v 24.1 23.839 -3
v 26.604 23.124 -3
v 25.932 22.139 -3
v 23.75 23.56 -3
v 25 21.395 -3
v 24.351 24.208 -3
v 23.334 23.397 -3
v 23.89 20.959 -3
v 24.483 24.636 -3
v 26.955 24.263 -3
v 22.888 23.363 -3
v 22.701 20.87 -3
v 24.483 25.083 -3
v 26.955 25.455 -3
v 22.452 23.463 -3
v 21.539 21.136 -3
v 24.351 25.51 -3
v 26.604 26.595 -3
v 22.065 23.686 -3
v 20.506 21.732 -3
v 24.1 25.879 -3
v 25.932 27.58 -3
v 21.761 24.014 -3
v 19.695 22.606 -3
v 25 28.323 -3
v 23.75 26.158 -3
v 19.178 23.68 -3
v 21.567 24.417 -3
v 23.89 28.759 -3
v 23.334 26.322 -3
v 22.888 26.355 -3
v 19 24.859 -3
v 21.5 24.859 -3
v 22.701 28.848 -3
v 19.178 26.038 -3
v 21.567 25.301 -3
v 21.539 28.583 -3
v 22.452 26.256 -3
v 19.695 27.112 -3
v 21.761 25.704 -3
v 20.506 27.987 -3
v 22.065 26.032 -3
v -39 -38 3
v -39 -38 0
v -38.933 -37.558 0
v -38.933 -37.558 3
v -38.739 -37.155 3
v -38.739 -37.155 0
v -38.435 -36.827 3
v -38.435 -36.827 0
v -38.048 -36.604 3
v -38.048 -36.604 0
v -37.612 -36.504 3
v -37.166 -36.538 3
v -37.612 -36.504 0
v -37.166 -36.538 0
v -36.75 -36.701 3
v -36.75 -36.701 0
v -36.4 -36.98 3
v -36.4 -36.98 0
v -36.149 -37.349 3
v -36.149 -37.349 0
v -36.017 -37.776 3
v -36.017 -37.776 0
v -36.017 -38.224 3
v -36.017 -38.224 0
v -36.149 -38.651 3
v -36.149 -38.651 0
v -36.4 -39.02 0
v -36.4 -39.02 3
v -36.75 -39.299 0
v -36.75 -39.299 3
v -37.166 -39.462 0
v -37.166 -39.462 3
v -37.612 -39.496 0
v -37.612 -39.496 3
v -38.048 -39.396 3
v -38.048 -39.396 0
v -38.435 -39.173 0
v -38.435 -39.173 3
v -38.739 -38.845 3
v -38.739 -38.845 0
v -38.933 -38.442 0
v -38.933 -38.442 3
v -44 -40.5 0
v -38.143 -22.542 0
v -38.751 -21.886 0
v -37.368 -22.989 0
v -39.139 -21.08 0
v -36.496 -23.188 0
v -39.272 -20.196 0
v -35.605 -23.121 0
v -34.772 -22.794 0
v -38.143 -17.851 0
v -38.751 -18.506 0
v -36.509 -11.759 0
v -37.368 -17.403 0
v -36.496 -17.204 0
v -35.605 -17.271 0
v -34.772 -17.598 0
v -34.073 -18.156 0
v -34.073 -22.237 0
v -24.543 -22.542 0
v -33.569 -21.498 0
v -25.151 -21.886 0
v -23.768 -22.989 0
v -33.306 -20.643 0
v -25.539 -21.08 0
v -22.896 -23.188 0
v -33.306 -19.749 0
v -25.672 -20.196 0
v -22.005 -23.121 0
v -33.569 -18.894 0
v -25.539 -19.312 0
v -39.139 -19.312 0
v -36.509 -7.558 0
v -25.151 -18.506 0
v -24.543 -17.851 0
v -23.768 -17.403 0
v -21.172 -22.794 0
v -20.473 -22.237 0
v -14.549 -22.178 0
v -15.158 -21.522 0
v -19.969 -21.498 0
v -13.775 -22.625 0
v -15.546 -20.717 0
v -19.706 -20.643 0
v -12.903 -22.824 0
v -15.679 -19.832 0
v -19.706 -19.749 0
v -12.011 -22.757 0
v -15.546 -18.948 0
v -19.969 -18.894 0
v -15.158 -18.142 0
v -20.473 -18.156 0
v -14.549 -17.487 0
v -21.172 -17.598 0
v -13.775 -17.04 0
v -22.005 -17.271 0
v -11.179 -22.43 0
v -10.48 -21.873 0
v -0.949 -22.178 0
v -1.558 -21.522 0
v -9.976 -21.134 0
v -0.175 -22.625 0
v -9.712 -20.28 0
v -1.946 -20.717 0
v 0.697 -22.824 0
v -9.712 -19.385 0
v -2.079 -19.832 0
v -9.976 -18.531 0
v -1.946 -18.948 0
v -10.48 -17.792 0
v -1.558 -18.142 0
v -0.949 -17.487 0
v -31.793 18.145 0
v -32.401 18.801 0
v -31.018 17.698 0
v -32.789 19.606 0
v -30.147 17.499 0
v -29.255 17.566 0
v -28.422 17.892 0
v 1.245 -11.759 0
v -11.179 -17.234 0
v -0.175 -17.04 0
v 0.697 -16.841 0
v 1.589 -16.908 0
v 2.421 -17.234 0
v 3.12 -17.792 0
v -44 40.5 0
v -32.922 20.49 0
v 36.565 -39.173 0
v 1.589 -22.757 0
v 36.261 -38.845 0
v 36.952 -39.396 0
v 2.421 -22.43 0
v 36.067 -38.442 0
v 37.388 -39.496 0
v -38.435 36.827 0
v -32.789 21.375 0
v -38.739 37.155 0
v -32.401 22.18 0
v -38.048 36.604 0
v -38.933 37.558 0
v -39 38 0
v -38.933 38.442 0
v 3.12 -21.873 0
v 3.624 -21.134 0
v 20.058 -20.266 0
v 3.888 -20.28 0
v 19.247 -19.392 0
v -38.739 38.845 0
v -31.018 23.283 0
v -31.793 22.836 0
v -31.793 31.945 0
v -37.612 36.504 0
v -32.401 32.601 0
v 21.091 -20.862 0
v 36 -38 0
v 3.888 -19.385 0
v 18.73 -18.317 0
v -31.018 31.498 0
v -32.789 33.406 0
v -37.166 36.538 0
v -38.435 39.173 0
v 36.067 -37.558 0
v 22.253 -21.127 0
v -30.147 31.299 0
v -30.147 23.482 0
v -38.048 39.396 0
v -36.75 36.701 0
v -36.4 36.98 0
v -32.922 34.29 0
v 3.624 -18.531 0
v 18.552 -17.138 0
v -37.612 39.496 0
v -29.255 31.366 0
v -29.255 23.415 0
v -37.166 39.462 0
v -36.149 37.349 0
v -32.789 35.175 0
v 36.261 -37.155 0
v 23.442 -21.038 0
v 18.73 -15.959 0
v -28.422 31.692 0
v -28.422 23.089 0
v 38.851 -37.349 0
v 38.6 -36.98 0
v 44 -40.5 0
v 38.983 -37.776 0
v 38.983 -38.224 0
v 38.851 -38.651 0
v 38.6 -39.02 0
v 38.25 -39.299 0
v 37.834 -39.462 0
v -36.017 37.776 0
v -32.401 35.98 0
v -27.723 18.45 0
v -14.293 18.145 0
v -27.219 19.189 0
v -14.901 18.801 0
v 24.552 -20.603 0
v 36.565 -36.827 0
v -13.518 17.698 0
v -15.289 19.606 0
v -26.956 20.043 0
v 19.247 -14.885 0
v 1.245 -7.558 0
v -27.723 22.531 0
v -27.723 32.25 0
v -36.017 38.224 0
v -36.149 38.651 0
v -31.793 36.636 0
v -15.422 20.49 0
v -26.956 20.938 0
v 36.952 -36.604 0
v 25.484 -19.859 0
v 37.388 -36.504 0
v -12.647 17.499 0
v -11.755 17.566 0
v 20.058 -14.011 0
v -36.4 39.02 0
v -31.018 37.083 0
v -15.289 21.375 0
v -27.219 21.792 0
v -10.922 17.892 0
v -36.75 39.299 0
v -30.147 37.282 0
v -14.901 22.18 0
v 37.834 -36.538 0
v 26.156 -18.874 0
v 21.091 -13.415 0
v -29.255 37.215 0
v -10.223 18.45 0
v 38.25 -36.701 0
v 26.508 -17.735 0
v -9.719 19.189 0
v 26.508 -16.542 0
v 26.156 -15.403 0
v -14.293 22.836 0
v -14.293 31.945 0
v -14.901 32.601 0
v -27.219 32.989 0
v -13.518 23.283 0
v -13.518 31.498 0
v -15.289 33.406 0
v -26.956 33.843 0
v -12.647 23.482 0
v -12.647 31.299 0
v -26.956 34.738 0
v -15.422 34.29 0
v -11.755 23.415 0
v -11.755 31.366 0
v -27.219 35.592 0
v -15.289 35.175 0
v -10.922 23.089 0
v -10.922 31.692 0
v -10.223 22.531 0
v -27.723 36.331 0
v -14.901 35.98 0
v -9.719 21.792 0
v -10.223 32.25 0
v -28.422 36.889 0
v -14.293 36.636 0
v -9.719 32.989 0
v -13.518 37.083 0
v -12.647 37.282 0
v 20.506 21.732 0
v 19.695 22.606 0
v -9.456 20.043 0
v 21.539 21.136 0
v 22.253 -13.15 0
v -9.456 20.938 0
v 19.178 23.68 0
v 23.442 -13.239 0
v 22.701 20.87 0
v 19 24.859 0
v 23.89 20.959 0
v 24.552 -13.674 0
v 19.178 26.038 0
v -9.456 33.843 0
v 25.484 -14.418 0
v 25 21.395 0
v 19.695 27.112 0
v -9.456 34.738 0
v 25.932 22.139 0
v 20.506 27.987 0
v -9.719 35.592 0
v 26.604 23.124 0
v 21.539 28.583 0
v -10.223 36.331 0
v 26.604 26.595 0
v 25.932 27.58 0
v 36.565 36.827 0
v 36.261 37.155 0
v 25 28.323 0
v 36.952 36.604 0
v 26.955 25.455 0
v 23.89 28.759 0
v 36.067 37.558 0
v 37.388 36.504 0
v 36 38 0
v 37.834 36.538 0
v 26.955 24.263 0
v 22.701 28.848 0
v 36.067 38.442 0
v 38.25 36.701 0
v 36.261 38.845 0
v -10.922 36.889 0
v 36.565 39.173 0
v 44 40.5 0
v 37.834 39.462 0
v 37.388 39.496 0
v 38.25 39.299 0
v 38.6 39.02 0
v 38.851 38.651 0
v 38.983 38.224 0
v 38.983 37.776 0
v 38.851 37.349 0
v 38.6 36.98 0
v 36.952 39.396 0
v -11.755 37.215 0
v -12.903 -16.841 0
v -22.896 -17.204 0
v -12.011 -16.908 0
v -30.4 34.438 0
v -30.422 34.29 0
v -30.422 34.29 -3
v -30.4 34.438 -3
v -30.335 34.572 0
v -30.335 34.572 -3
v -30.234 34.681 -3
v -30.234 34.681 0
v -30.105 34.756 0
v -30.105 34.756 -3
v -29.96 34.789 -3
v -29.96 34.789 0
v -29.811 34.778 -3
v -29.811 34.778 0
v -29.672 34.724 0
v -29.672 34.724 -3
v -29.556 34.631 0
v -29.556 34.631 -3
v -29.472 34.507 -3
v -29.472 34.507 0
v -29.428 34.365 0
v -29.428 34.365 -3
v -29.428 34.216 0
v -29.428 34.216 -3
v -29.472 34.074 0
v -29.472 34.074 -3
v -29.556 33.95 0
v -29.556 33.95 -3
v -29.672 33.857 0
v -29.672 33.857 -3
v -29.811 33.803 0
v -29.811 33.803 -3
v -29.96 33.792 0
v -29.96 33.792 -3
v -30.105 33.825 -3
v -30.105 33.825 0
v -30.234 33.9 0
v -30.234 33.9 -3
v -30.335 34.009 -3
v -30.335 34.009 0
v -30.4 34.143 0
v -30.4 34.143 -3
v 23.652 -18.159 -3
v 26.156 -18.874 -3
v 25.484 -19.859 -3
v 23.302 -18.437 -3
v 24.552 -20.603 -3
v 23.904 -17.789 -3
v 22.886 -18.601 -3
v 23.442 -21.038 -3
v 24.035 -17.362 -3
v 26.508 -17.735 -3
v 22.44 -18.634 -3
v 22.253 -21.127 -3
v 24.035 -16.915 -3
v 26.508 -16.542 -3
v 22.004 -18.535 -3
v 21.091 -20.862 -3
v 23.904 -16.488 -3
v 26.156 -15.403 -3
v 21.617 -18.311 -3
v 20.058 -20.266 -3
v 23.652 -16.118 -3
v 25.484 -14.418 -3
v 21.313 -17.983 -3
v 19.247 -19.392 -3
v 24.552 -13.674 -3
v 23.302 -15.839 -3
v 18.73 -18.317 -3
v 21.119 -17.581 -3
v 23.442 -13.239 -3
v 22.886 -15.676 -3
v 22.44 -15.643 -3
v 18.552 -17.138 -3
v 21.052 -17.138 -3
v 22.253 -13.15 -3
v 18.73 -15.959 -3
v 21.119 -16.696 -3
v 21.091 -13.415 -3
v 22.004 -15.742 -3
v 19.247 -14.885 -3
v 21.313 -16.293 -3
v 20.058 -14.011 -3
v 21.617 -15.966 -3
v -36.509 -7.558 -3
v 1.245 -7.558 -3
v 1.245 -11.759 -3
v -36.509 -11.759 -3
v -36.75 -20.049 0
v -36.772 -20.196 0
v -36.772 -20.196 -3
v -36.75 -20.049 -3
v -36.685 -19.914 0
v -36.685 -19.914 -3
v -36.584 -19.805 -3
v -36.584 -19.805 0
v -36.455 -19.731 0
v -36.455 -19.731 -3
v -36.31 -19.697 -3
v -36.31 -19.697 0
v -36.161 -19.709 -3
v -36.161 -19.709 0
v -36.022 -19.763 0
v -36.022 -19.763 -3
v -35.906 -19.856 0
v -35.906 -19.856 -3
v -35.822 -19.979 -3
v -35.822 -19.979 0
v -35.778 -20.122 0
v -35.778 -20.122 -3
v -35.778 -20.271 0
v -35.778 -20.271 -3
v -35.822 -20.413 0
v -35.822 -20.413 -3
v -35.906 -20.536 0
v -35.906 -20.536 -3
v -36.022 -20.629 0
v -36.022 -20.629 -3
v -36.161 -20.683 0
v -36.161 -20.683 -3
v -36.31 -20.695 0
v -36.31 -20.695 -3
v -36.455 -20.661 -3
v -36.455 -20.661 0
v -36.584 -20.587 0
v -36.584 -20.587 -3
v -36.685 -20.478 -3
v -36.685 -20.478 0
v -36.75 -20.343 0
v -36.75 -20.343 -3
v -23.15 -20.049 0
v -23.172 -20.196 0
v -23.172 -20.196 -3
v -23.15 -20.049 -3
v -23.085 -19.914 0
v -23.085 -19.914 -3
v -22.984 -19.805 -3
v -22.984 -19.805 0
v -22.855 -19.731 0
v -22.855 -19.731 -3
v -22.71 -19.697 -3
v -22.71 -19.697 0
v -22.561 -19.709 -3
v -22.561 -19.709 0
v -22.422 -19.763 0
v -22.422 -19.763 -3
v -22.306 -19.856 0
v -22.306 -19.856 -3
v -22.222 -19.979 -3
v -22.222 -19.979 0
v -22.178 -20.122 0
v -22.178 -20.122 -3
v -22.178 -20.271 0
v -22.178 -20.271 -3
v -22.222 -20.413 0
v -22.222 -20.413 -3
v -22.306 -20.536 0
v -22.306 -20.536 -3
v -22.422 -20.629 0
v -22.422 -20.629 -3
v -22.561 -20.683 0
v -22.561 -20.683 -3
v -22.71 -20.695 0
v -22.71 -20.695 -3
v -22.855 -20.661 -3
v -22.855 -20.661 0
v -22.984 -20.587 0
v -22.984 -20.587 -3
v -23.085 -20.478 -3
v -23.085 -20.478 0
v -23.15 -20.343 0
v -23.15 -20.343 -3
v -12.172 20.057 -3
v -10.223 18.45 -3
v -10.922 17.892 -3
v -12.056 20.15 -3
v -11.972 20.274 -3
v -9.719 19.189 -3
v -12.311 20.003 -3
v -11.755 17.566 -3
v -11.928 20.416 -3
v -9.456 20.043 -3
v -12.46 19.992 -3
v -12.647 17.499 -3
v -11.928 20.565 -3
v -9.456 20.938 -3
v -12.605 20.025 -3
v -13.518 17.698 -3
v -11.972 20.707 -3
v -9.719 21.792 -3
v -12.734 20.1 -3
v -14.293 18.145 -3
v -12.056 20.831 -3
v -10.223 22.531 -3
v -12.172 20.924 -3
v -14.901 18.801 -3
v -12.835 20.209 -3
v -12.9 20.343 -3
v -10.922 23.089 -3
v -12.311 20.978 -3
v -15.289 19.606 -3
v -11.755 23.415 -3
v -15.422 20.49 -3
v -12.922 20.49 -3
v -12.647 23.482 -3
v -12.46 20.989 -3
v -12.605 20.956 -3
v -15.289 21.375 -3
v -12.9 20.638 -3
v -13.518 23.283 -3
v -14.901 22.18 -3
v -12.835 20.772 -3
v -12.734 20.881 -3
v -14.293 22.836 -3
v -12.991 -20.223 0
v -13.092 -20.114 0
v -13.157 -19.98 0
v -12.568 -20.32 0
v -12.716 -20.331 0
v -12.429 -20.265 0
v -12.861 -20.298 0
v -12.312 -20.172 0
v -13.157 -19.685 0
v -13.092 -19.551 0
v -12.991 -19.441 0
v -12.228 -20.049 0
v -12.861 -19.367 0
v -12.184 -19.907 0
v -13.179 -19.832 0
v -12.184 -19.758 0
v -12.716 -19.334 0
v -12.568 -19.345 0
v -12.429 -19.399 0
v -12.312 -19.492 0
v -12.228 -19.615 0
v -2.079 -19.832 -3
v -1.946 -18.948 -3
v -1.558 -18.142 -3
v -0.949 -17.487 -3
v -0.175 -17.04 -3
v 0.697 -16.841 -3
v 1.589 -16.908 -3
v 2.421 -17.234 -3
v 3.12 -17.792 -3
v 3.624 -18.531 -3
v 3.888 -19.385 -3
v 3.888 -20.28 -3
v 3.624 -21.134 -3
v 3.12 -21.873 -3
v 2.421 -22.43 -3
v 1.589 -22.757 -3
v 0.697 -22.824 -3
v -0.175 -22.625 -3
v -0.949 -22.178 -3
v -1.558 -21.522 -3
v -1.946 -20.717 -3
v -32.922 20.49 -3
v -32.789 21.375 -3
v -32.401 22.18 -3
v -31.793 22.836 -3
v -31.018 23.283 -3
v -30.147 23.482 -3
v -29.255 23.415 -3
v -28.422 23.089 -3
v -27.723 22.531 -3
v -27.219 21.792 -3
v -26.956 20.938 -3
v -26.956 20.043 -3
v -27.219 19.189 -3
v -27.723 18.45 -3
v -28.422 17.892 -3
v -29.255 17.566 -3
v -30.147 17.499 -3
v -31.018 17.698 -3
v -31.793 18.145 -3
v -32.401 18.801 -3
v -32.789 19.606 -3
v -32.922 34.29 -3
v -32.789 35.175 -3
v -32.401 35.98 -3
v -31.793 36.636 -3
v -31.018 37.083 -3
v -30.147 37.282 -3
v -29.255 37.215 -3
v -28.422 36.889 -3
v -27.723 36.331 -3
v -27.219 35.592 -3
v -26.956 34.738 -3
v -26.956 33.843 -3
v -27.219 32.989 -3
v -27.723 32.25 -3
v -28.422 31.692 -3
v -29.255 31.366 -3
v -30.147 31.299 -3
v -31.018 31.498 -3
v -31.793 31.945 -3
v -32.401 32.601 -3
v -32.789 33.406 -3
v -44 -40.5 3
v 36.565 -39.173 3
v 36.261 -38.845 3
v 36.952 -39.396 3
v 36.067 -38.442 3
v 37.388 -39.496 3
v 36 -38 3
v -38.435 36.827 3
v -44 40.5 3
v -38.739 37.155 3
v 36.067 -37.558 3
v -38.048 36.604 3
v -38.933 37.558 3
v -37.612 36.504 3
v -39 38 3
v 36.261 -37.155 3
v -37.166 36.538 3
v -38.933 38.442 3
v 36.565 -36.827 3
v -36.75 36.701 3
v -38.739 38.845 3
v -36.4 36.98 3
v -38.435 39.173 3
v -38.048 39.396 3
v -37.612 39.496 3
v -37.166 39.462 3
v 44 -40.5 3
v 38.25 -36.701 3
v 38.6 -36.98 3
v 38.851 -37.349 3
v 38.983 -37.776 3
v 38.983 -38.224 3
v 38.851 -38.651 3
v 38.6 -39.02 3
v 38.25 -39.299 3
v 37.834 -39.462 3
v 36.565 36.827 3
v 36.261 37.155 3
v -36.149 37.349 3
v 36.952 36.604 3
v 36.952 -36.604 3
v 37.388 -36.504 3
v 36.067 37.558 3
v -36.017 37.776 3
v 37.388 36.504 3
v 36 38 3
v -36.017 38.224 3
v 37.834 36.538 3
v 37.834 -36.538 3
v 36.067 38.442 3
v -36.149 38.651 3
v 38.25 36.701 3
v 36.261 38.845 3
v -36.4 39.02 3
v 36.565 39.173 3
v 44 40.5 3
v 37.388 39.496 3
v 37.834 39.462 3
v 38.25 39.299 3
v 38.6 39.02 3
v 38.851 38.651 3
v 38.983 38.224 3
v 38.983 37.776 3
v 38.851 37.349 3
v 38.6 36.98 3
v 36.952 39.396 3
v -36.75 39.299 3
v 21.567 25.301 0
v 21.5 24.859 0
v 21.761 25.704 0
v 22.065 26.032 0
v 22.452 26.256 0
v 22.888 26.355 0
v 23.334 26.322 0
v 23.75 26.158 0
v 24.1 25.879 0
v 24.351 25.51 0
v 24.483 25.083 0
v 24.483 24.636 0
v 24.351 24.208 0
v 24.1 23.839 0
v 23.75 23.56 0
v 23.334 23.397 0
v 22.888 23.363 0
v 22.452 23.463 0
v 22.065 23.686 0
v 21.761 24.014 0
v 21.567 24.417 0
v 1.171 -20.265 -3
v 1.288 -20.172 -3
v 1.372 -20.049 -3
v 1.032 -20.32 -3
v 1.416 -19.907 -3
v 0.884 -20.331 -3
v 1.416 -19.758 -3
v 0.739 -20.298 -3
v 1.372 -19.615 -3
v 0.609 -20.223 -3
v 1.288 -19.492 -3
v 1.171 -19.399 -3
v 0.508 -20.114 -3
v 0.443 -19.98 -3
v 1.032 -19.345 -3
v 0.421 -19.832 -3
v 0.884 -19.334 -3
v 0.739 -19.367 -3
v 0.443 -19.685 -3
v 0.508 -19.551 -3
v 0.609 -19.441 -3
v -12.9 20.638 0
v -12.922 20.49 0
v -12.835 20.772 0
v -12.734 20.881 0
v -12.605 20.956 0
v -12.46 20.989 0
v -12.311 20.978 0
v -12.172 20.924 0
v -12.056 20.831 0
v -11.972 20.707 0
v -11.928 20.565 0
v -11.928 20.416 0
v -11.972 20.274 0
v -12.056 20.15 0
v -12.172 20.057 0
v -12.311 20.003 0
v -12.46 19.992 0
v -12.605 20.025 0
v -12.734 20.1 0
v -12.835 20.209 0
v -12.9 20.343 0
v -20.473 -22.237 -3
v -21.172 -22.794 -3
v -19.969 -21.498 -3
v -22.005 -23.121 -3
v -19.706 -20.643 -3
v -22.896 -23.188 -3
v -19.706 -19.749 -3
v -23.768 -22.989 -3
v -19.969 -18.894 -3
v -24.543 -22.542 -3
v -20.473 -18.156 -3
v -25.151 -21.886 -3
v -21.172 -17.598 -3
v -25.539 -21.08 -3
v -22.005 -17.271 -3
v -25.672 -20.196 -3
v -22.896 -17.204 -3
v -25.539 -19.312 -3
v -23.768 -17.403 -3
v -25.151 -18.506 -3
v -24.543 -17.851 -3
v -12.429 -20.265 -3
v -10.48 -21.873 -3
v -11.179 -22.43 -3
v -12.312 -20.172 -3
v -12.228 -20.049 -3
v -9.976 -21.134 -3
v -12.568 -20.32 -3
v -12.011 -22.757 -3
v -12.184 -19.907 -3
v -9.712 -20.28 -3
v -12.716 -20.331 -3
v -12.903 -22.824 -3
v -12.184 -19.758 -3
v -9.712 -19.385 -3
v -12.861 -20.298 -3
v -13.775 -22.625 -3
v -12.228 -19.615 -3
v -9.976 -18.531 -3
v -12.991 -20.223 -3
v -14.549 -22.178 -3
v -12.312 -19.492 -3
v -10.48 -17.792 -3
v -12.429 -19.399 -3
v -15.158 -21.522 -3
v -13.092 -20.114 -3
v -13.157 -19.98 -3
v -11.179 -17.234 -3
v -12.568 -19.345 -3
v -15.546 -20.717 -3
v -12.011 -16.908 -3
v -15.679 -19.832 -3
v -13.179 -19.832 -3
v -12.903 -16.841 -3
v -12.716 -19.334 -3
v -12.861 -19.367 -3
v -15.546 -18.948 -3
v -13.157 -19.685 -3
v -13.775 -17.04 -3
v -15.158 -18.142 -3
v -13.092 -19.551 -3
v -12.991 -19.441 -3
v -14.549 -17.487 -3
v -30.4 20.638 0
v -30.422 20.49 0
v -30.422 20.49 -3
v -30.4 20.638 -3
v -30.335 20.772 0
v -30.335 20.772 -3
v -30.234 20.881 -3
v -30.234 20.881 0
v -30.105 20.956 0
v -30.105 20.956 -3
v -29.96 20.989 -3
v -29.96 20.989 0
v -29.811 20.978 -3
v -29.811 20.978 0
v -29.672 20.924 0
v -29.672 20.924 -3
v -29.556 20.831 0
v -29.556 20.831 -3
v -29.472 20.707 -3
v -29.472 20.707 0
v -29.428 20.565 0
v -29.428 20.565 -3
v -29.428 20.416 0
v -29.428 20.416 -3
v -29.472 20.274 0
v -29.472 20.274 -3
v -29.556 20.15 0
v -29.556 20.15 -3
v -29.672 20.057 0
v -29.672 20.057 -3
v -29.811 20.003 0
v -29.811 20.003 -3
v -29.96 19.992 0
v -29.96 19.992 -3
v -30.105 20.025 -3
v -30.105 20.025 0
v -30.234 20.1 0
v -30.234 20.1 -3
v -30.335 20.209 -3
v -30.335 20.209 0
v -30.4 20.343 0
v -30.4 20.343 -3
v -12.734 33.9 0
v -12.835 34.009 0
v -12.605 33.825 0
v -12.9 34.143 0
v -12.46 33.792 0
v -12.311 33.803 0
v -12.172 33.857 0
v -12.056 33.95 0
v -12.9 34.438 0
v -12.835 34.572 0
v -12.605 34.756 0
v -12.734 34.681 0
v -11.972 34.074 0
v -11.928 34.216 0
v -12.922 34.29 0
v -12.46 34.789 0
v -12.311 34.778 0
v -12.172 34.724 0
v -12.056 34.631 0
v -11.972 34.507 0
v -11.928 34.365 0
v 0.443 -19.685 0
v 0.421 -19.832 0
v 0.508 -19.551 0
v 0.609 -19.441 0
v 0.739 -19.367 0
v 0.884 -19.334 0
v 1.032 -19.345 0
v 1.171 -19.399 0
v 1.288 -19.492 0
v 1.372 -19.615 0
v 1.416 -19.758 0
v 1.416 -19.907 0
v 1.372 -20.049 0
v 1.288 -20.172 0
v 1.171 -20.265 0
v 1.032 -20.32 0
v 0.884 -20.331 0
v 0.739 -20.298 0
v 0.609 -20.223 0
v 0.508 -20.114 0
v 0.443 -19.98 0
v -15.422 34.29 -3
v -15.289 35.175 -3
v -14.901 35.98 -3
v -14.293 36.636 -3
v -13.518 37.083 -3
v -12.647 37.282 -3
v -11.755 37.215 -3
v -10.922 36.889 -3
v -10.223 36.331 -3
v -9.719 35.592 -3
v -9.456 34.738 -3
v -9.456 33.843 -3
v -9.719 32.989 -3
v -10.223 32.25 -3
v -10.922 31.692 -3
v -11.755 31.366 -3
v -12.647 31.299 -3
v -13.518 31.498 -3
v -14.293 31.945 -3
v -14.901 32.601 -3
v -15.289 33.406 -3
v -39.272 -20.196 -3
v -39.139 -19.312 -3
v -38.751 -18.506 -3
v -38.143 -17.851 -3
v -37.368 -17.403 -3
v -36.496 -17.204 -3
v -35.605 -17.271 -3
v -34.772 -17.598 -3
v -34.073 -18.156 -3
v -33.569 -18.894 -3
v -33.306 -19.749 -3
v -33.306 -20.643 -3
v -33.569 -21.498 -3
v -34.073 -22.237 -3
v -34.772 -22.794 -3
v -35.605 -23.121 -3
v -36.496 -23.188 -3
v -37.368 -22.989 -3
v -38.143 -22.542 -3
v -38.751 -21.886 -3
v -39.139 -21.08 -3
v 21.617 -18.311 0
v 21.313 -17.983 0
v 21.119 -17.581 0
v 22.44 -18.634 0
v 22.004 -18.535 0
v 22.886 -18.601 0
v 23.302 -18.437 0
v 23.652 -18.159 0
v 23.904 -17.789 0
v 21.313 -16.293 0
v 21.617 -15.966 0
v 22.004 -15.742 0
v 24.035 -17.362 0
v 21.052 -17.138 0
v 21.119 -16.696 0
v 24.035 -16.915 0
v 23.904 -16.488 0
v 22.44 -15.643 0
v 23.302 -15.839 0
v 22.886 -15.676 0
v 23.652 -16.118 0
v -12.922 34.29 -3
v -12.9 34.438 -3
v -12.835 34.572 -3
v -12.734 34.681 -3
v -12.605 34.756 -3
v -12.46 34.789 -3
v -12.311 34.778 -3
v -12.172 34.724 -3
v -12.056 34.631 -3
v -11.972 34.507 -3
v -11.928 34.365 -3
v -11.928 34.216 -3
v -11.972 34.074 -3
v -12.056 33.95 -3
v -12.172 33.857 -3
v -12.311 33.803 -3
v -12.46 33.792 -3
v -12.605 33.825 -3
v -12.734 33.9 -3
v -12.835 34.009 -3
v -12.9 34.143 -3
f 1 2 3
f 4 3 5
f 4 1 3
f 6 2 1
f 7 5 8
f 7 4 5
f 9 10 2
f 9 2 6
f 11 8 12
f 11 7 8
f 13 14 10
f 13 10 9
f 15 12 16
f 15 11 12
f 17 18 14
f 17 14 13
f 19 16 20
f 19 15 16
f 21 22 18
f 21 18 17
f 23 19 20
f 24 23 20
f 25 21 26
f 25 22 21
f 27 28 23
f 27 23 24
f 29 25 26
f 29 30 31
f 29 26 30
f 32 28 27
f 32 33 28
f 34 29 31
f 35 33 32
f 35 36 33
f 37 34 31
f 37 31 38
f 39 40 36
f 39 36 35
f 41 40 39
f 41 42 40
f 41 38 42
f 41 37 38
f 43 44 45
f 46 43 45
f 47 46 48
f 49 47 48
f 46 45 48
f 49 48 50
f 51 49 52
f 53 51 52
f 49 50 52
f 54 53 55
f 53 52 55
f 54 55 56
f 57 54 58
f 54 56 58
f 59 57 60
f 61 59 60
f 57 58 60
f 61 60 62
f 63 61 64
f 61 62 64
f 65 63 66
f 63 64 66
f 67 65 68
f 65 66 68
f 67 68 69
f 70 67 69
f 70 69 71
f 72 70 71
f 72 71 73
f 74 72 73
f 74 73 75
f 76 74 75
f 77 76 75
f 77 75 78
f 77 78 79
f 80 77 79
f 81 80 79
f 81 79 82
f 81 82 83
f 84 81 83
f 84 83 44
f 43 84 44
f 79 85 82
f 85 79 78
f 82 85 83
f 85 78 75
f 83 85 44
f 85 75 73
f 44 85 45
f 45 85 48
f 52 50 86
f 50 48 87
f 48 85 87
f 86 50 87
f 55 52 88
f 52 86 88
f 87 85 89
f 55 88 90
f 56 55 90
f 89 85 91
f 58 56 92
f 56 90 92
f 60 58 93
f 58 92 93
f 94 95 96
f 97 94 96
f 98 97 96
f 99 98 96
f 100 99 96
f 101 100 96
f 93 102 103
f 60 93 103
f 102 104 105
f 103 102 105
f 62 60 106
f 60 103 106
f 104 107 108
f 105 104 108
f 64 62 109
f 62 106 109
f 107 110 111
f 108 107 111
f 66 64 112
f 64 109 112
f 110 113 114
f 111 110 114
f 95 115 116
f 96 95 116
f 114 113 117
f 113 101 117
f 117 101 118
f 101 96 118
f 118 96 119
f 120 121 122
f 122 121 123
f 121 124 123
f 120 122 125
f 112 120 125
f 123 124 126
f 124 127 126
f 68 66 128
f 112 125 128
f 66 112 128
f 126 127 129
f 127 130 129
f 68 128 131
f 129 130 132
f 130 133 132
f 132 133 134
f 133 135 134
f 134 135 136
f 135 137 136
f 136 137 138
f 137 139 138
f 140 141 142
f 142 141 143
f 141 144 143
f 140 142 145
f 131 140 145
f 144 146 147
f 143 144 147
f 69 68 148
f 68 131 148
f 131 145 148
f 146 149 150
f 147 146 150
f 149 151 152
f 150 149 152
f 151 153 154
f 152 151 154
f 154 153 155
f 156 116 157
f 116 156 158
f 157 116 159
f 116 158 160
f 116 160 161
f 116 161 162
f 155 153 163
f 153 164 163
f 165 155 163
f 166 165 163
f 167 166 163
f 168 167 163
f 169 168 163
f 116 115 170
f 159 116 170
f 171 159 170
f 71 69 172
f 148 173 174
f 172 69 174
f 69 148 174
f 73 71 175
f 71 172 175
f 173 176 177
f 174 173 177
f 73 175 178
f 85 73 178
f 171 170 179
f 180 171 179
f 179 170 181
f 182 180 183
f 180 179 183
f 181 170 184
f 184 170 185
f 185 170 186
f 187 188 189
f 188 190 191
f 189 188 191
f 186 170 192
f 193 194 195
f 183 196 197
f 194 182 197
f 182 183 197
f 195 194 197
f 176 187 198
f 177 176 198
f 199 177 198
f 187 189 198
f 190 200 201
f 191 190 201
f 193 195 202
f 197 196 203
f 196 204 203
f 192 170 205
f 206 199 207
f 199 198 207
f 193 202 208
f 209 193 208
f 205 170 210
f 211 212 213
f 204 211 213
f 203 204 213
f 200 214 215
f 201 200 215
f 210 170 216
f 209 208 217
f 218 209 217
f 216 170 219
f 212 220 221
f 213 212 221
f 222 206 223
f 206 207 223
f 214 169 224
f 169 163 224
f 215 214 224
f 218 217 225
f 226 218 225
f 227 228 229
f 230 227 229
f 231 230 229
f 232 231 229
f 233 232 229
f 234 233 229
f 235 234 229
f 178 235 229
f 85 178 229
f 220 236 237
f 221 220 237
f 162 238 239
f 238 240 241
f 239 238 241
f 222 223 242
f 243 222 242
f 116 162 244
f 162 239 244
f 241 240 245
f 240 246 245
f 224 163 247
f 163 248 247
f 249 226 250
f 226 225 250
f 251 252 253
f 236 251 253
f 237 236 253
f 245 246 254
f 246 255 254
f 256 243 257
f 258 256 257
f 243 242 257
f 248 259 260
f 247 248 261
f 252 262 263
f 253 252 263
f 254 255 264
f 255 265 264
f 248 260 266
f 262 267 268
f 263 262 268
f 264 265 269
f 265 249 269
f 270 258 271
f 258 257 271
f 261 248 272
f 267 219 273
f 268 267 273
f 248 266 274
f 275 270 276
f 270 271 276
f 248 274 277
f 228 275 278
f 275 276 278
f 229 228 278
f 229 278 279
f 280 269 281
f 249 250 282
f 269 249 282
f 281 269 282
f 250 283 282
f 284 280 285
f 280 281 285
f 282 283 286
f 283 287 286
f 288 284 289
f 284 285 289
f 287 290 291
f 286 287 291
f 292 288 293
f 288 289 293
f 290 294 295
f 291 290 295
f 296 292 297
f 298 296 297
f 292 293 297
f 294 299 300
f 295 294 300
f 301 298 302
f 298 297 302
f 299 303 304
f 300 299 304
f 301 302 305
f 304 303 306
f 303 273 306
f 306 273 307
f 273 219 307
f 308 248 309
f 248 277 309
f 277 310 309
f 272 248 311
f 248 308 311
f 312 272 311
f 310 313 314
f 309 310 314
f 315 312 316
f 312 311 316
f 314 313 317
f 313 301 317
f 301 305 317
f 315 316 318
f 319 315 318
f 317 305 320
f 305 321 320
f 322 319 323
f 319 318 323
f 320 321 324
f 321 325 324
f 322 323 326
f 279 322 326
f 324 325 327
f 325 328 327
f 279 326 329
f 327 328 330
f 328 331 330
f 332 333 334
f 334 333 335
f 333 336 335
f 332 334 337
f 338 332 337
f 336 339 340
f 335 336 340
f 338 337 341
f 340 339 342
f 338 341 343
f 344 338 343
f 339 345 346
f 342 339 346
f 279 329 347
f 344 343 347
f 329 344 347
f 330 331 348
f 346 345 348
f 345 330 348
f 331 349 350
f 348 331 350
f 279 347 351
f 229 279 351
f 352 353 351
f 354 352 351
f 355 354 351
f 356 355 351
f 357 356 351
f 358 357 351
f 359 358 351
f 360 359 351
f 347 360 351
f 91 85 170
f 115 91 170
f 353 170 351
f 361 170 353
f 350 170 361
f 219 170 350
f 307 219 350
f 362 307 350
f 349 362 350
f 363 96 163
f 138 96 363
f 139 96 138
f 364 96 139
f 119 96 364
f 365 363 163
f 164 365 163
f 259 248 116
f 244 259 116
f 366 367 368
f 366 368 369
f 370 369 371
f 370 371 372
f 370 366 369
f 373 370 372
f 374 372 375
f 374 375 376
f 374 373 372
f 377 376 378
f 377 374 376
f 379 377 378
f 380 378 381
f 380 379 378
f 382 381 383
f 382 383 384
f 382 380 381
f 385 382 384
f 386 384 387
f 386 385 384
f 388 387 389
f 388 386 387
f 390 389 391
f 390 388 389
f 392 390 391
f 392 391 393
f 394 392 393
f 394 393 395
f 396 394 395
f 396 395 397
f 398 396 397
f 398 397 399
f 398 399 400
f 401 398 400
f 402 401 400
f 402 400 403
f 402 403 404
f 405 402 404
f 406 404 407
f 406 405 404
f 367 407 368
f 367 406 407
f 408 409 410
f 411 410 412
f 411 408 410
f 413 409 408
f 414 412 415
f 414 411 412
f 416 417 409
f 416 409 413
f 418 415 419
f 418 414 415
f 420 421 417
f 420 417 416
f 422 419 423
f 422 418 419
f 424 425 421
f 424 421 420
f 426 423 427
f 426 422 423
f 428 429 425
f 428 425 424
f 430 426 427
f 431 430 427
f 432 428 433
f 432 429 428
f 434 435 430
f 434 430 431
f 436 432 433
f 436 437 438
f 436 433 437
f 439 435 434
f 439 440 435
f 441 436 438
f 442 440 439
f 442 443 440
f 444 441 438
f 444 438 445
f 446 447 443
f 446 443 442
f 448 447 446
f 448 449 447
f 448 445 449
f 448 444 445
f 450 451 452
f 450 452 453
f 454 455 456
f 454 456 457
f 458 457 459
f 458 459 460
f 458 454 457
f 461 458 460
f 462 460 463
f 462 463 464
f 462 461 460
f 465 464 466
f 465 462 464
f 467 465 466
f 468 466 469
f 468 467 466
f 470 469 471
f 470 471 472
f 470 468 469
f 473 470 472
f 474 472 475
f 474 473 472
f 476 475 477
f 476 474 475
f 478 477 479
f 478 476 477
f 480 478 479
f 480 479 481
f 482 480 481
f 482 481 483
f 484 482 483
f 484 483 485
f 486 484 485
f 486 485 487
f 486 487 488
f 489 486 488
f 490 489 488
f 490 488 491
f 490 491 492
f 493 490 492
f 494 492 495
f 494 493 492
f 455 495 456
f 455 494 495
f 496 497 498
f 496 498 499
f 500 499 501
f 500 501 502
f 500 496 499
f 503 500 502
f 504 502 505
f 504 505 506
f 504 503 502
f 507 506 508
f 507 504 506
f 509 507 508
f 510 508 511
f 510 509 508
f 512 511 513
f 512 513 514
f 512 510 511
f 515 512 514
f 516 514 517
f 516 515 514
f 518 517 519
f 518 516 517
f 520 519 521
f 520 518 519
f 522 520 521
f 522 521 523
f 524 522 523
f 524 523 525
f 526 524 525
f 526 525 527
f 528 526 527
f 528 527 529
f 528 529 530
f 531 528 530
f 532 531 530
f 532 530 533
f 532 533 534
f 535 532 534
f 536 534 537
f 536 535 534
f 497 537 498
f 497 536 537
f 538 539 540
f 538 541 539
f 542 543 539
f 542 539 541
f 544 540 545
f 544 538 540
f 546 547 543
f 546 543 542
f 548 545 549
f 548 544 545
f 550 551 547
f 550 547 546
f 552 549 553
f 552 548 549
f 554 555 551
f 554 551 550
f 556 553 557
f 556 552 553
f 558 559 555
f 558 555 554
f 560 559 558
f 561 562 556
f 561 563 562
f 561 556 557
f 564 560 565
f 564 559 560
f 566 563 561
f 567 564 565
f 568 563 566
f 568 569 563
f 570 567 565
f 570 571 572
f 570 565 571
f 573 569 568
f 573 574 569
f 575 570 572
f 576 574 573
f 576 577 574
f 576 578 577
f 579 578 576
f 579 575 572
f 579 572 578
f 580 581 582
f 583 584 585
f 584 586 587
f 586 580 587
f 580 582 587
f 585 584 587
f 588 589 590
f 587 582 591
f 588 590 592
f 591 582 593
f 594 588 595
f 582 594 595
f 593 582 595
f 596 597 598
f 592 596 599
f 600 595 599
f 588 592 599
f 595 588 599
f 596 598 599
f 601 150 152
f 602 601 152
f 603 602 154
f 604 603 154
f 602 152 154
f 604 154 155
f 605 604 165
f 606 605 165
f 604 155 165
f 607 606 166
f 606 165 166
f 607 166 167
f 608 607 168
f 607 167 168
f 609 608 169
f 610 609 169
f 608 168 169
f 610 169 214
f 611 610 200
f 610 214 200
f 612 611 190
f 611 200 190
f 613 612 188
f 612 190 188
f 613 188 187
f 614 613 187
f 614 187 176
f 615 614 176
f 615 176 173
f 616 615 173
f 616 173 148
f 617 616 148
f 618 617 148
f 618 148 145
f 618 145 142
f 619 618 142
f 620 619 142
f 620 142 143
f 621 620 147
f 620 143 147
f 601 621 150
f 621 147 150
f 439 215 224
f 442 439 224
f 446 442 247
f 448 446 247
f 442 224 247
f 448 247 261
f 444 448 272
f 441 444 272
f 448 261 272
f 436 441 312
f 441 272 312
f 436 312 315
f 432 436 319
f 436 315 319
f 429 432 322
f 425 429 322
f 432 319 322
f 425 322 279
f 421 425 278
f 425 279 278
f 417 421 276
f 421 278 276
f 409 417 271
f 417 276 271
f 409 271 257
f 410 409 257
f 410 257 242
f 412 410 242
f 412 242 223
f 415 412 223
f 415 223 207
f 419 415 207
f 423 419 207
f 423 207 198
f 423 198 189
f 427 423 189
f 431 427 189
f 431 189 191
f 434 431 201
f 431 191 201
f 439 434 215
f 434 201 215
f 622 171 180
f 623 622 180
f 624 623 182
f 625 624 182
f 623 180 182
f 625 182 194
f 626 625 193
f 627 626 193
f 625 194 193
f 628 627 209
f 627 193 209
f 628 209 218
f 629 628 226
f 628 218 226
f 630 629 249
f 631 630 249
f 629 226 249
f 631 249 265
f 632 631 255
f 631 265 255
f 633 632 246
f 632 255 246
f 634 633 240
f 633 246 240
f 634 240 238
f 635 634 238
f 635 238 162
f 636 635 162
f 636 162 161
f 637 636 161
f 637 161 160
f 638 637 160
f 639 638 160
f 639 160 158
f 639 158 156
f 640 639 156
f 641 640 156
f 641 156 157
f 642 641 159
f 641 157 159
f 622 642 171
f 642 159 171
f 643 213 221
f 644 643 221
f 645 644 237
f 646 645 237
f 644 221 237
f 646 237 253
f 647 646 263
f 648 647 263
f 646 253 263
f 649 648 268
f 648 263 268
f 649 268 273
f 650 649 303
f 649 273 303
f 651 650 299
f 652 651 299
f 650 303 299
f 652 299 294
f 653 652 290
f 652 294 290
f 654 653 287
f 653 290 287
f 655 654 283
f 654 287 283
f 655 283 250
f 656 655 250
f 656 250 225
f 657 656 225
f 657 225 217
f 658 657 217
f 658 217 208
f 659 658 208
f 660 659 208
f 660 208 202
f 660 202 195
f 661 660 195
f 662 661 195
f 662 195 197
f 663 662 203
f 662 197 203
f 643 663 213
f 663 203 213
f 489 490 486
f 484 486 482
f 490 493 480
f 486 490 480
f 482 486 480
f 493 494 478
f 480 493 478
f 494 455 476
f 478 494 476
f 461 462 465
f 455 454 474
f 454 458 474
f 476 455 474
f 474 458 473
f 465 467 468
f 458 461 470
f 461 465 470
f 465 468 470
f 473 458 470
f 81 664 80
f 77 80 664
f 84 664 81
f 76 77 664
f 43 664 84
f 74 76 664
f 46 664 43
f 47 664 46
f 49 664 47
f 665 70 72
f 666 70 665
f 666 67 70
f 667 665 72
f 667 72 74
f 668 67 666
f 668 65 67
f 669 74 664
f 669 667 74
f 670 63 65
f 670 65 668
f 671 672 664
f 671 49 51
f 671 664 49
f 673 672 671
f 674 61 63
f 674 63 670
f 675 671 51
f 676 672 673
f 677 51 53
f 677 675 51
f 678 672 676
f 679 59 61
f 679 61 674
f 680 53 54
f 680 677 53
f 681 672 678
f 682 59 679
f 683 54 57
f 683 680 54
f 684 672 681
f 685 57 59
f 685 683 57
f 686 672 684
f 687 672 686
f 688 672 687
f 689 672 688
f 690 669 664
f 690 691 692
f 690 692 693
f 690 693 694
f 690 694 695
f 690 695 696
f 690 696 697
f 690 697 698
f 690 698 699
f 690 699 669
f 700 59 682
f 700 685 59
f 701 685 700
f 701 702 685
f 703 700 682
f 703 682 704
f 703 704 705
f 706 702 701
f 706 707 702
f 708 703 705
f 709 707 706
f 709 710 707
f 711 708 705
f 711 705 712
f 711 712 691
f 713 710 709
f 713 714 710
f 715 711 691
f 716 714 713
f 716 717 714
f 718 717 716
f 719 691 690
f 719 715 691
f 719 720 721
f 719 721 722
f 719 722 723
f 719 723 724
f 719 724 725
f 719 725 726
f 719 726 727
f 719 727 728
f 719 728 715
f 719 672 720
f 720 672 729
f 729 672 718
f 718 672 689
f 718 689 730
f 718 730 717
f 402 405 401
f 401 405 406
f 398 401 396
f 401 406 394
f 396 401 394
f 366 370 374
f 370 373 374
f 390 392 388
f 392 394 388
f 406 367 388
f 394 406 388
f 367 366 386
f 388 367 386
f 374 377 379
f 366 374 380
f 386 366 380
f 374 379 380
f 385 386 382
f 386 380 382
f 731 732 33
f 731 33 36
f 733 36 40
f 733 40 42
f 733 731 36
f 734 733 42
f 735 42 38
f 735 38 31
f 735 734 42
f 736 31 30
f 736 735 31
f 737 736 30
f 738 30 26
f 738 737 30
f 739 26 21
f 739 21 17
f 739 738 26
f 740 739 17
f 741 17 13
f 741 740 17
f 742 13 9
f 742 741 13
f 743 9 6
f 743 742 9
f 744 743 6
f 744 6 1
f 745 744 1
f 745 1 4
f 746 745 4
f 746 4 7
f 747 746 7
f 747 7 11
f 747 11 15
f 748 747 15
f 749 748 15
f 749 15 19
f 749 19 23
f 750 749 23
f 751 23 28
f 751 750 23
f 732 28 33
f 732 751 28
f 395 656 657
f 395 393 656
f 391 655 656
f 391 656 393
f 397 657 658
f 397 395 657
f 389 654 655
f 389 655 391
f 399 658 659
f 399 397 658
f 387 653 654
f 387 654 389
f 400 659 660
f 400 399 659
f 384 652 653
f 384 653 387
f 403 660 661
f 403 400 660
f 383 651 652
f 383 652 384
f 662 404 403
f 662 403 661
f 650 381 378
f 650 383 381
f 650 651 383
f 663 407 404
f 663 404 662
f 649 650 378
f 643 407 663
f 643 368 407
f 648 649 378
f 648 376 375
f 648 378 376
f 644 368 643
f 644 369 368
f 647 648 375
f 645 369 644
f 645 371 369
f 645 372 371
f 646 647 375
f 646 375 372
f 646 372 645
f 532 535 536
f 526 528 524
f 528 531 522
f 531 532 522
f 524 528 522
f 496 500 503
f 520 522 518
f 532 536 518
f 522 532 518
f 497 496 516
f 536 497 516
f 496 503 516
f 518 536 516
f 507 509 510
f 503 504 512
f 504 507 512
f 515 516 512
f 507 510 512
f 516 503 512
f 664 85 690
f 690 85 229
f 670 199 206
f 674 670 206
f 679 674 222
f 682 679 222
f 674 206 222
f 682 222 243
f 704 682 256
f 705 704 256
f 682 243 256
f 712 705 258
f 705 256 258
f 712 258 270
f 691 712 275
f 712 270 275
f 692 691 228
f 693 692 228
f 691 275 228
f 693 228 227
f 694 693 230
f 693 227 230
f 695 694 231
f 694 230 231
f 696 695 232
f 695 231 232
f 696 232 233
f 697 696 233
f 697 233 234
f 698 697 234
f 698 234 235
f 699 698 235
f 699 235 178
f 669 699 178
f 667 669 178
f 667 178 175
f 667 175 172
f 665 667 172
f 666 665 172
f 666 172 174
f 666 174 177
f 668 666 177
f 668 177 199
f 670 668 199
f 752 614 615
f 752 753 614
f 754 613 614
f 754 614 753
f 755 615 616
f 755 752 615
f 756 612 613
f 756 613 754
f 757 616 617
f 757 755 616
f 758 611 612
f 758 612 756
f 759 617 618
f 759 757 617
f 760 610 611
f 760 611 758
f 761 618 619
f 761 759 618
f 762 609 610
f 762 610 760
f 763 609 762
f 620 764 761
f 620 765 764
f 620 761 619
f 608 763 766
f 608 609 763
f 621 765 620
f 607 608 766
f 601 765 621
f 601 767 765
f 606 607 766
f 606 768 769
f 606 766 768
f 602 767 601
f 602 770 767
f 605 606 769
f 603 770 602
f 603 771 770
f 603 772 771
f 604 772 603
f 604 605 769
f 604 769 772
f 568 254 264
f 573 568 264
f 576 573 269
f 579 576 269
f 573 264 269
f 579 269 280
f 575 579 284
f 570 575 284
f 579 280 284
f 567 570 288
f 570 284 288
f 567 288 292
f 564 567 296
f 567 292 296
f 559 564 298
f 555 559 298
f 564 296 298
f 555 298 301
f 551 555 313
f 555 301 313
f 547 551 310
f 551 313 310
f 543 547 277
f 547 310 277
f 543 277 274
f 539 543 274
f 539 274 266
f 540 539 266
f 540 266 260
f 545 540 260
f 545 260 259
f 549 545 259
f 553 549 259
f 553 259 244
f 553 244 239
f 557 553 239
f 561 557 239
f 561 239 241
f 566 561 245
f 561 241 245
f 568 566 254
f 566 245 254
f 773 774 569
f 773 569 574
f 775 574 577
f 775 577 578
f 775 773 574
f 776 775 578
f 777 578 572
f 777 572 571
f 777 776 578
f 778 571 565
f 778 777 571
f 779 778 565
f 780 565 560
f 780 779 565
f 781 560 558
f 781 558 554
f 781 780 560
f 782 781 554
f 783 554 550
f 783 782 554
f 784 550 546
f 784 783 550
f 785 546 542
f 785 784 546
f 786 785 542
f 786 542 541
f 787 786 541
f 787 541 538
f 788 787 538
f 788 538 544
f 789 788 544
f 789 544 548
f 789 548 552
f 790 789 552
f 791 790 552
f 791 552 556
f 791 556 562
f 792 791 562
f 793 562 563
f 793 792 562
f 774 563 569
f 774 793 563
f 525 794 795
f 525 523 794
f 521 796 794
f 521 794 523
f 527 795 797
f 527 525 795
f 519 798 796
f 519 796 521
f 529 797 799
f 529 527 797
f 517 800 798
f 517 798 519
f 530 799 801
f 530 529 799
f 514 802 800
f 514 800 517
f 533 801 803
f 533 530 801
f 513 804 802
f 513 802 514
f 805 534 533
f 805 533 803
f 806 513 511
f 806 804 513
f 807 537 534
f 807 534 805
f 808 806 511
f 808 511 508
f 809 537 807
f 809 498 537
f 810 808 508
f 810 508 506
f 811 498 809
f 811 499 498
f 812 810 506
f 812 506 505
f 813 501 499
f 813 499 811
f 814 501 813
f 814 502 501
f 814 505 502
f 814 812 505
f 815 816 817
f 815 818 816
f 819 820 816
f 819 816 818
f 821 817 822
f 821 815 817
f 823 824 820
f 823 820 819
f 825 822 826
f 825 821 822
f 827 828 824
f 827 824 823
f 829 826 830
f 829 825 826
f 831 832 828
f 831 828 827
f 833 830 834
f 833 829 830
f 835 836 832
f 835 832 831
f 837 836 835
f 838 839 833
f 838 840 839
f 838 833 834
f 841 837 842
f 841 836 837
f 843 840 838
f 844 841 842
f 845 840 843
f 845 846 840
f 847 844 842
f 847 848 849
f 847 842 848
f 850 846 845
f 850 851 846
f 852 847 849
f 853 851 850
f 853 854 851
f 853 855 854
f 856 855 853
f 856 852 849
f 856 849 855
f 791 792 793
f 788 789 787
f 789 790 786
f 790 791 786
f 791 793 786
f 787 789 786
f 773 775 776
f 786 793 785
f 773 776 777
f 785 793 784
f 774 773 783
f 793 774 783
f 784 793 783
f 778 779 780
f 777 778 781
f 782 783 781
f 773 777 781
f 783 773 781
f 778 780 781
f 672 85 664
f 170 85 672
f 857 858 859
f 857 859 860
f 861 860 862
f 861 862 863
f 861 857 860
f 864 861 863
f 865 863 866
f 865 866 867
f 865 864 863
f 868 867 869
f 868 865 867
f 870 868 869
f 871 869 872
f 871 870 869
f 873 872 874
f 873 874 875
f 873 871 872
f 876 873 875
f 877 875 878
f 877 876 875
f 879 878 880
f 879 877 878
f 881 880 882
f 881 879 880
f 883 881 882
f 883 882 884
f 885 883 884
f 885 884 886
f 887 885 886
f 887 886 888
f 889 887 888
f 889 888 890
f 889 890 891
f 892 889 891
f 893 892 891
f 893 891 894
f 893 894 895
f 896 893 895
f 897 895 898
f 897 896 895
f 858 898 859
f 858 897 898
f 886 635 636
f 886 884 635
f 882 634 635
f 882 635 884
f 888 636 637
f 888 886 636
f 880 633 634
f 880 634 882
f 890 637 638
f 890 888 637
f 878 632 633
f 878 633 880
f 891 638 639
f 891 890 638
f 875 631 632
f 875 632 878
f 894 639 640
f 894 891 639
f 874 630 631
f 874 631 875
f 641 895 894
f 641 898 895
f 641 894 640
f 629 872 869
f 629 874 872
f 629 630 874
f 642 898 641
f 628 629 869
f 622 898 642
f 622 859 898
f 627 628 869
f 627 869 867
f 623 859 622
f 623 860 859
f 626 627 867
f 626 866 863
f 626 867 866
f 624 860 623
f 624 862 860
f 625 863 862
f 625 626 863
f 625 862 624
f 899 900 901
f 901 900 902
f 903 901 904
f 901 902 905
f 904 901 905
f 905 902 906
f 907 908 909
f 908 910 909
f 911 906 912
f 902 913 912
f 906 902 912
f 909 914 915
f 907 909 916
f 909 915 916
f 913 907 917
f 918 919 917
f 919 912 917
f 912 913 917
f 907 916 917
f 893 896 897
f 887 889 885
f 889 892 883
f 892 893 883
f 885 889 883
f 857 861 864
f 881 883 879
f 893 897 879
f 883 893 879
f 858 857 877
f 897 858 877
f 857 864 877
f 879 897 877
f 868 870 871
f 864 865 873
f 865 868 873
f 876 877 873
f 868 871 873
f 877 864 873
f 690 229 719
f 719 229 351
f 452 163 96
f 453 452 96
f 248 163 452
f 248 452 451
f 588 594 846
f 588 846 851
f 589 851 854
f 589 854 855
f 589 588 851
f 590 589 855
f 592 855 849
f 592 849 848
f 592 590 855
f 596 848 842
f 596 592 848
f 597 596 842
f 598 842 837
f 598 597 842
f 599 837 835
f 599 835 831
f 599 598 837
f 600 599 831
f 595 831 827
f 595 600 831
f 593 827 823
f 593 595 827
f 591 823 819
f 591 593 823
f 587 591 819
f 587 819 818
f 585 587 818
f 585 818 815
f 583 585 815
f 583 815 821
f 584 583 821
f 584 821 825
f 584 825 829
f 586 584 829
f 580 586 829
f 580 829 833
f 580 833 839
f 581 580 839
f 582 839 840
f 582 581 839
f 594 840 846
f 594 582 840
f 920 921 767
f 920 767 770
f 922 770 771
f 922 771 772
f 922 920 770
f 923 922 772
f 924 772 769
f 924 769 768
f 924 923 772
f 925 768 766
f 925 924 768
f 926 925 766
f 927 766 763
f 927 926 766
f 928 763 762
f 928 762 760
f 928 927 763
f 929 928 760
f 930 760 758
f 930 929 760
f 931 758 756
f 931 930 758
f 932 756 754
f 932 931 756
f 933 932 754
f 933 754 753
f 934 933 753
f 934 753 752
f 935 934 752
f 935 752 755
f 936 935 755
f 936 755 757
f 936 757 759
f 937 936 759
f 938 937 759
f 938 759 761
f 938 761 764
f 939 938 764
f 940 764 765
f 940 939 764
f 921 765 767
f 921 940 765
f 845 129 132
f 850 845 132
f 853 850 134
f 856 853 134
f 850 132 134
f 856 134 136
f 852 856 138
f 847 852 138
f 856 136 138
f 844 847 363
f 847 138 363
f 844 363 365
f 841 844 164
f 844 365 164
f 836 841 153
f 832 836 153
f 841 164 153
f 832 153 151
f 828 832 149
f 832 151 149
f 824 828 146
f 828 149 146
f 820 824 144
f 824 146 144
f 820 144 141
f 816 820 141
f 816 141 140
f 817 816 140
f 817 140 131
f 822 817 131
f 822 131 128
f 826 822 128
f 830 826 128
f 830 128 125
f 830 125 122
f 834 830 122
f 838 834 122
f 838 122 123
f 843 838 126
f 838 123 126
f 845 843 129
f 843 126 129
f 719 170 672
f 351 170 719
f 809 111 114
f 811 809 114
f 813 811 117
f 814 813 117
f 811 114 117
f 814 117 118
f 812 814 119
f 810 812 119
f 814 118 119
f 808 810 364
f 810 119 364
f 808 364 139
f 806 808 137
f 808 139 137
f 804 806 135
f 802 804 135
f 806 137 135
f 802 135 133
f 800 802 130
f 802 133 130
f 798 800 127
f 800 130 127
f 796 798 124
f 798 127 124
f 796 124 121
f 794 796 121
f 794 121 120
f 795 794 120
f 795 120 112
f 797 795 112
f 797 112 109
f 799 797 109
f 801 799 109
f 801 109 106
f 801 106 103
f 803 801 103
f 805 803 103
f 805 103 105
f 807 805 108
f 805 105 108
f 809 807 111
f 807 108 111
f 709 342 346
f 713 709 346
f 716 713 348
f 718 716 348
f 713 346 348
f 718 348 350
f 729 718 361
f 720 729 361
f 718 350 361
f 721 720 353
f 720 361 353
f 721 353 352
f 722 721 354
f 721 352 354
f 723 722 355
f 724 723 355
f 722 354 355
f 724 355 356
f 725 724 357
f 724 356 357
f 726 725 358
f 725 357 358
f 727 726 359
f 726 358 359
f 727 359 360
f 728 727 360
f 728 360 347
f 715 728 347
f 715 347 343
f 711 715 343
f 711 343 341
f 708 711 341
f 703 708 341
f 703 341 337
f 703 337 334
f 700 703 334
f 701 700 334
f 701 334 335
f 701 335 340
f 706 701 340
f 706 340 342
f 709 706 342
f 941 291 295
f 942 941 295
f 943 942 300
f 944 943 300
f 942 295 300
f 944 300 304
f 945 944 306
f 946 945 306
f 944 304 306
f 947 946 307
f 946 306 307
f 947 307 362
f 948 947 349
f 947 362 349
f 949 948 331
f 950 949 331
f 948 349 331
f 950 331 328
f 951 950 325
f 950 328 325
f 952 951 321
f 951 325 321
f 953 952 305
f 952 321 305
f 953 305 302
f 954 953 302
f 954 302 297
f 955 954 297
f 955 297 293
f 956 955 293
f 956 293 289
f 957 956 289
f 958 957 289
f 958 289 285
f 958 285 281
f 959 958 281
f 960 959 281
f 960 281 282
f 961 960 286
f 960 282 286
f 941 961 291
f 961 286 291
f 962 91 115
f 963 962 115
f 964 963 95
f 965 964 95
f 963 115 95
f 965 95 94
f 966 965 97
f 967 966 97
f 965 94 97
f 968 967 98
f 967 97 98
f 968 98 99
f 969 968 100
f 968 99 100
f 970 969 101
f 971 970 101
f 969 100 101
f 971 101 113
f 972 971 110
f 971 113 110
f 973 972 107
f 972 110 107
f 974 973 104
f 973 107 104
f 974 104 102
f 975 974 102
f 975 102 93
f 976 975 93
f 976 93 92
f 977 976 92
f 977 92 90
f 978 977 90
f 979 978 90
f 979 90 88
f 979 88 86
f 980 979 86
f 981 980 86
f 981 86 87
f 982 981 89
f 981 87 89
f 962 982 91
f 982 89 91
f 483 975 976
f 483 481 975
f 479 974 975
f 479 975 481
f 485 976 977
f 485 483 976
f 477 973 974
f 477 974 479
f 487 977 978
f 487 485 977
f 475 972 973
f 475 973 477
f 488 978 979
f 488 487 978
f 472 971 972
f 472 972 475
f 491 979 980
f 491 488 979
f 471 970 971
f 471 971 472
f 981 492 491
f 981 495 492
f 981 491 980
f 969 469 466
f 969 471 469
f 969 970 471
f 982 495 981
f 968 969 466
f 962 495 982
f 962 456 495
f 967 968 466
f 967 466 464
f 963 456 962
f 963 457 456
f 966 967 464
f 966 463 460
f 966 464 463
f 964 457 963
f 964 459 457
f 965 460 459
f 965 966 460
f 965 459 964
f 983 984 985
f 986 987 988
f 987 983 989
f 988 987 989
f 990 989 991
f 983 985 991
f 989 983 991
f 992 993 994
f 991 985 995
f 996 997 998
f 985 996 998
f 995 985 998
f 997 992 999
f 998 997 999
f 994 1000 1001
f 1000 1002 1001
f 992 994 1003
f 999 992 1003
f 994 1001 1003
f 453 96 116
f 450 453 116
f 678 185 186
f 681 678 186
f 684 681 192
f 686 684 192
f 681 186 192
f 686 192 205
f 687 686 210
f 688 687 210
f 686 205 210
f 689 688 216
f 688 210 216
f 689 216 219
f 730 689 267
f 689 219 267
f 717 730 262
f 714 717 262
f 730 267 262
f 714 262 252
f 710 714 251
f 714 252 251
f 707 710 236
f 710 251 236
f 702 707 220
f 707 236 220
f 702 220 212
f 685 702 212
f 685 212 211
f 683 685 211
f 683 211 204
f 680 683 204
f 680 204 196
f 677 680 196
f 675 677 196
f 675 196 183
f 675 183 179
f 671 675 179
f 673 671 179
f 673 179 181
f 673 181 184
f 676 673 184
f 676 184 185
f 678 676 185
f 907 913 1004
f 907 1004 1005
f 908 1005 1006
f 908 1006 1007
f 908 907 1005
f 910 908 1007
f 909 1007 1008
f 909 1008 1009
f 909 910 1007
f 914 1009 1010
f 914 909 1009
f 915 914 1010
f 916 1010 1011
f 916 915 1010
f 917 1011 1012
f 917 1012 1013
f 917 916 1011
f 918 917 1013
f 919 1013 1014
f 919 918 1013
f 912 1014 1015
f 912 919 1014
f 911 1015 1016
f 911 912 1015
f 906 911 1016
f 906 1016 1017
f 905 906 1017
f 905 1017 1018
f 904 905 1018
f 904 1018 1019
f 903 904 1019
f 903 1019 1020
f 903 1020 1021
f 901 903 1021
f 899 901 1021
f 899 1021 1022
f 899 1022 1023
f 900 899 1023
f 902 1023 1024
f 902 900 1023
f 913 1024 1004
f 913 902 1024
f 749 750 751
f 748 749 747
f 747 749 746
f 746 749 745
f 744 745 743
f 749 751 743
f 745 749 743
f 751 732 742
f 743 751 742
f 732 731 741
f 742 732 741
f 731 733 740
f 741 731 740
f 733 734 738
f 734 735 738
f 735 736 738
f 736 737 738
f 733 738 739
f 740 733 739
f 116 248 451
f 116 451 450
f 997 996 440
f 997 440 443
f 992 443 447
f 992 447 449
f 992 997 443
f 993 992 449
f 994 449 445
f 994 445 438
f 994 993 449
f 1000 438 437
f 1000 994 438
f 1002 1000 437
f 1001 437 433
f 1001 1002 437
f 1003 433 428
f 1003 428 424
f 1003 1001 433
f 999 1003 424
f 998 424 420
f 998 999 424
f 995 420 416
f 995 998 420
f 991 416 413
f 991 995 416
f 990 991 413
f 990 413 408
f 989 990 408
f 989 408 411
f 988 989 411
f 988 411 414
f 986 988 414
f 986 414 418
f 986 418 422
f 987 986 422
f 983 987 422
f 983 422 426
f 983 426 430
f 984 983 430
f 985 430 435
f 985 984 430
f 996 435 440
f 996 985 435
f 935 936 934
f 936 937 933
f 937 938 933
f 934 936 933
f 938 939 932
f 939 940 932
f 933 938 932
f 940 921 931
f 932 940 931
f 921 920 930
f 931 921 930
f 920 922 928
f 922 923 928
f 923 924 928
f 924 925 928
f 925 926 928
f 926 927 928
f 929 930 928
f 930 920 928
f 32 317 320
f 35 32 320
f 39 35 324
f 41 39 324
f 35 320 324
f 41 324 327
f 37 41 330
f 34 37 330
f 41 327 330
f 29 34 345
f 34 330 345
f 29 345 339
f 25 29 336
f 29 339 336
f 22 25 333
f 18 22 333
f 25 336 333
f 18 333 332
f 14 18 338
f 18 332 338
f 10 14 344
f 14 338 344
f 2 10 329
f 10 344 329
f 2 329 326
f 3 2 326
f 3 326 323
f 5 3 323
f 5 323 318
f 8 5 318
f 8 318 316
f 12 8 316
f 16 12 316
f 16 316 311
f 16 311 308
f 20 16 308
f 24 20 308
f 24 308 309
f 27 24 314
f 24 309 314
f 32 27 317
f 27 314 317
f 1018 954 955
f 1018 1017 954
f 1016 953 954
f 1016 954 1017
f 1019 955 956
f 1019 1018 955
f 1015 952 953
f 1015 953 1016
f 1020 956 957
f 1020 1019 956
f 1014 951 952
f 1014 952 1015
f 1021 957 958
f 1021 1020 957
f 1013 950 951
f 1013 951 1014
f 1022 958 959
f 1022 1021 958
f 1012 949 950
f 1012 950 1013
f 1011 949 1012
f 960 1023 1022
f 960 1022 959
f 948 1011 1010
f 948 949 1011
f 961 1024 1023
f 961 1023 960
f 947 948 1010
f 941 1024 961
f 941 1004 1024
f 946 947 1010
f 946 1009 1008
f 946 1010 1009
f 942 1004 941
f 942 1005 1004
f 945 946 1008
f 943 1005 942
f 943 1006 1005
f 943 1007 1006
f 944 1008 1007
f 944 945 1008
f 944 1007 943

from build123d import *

# Parameters (mm, degrees)
SKETCH1_W           = 88
SKETCH1_H           = 81
BOSS_EXTRUDE1_DEPTH = 3
SKETCH2_R           = 3
SKETCH2_R_2         = 0.5
REGULATOR_DEPTH     = 3
SKETCH3_R           = 4
SKETCH3_R_2         = 1.5
ARDUIONO_DEPTH      = 3
SKETCH4_R           = 3
SKETCH4_R_2         = 0.5
SKETCH4_W           = 37.754434331
SKETCH4_H           = 4.20099223
RELAY_DEPTH         = 3
SKETCH5_R           = 1.5
CUT_EXTRUDE1_DEPTH  = 60.876957171


with BuildPart() as part:
    # Sketch1 → Boss-Extrude1 (new body)
    with BuildSketch(Plane.XY):
        Rectangle(SKETCH1_W, SKETCH1_H)
    extrude(amount=BOSS_EXTRUDE1_DEPTH)

    # Sketch2 → regulator (add)
    # profile 1 of 4: a face of its own
    with BuildSketch(Plane(origin=(0, 0, 0), x_dir=(-1, 0, 0), z_dir=(0, 0, -1))):
        with Locations((12.422333314, 20.490496054)):
            Circle(SKETCH2_R)
        with Locations((12.422333314, 20.490496054)):
            Circle(SKETCH2_R_2, mode=Mode.SUBTRACT)
    # profile 2 of 4: a face of its own
    with BuildSketch(Plane(origin=(0, 0, 0), x_dir=(-1, 0, 0), z_dir=(0, 0, -1))):
        with Locations((29.922333314, 20.490496054)):
            Circle(SKETCH2_R)
        with Locations((29.922333314, 20.490496054)):
            Circle(SKETCH2_R_2, mode=Mode.SUBTRACT)
    # profile 3 of 4: a face of its own
    with BuildSketch(Plane(origin=(0, 0, 0), x_dir=(-1, 0, 0), z_dir=(0, 0, -1))):
        with Locations((12.422333314, 34.290496054)):
            Circle(SKETCH2_R)
        with Locations((12.422333314, 34.290496054)):
            Circle(SKETCH2_R_2, mode=Mode.SUBTRACT)
    # profile 4 of 4: a face of its own
    with BuildSketch(Plane(origin=(0, 0, 0), x_dir=(-1, 0, 0), z_dir=(0, 0, -1))):
        with Locations((29.922333314, 34.290496054)):
            Circle(SKETCH2_R)
        with Locations((29.922333314, 34.290496054)):
            Circle(SKETCH2_R_2, mode=Mode.SUBTRACT)
    extrude(amount=REGULATOR_DEPTH)

    # Sketch3 → arduiono (add)
    # profile 1 of 2: a face of its own
    with BuildSketch(Plane(origin=(0, 0, 0), x_dir=(-1, 0, 0), z_dir=(0, 0, -1))):
        with Locations((-23, 24.859193612)):
            Circle(SKETCH3_R)
        with Locations((-23, 24.859193612)):
            Circle(SKETCH3_R_2, mode=Mode.SUBTRACT)
    # profile 2 of 2: a face of its own
    with BuildSketch(Plane(origin=(0, 0, 0), x_dir=(-1, 0, 0), z_dir=(0, 0, -1))):
        with Locations((-22.552178991, -17.138418896)):
            Circle(SKETCH3_R)
        with Locations((-22.552178991, -17.138418896)):
            Circle(SKETCH3_R_2, mode=Mode.SUBTRACT)
    extrude(amount=ARDUIONO_DEPTH)

    # Sketch4 → relay (add)
    # profile 1 of 5: a face of its own
    with BuildSketch(Plane(origin=(0, 0, 0), x_dir=(-1, 0, 0), z_dir=(0, 0, -1))):
        with Locations((36.272183711, -20.196025136)):
            Circle(SKETCH4_R)
        with Locations((36.272183711, -20.196025136)):
            Circle(SKETCH4_R_2, mode=Mode.SUBTRACT)
    # profile 2 of 5: a face of its own
    with BuildSketch(Plane(origin=(0, 0, 0), x_dir=(-1, 0, 0), z_dir=(0, 0, -1))):
        with Locations((22.672183711, -20.196025136)):
            Circle(SKETCH4_R)
        with Locations((22.672183711, -20.196025136)):
            Circle(SKETCH4_R_2, mode=Mode.SUBTRACT)
    # profile 3 of 5: a face of its own
    with BuildSketch(Plane(origin=(0, 0, 0), x_dir=(-1, 0, 0), z_dir=(0, 0, -1))):
        with Locations((12.678796965, -19.832402608)):
            Circle(SKETCH4_R)
        with Locations((12.678796965, -19.832402608)):
            Circle(SKETCH4_R_2, mode=Mode.SUBTRACT)
    # profile 4 of 5: a face of its own
    with BuildSketch(Plane(origin=(0, 0, 0), x_dir=(-1, 0, 0), z_dir=(0, 0, -1))):
        with Locations((-0.921203035, -19.832402608)):
            Circle(SKETCH4_R)
        with Locations((-0.921203035, -19.832402608)):
            Circle(SKETCH4_R_2, mode=Mode.SUBTRACT)
    # profile 5 of 5: a face of its own
    with BuildSketch(Plane(origin=(0, 0, 0), x_dir=(-1, 0, 0), z_dir=(0, 0, -1))):
        with Locations((17.631890713, -9.658418225)):
            Rectangle(SKETCH4_W, SKETCH4_H)
    extrude(amount=RELAY_DEPTH)

    # Sketch5 → Cut-Extrude1 (cut, through all)
    with BuildSketch(Plane(origin=(0, 0, 0), x_dir=(-1, 0, 0), z_dir=(0, 0, -1))):
        with Locations((-37.5, 38)):
            Circle(SKETCH5_R)
        with Locations((37.5, 38)):
            Circle(SKETCH5_R)
        with Locations((37.5, -38)):
            Circle(SKETCH5_R)
        with Locations((-37.5, -38)):
            Circle(SKETCH5_R)
    extrude(amount=-CUT_EXTRUDE1_DEPTH, mode=Mode.SUBTRACT)


solid = part.part
